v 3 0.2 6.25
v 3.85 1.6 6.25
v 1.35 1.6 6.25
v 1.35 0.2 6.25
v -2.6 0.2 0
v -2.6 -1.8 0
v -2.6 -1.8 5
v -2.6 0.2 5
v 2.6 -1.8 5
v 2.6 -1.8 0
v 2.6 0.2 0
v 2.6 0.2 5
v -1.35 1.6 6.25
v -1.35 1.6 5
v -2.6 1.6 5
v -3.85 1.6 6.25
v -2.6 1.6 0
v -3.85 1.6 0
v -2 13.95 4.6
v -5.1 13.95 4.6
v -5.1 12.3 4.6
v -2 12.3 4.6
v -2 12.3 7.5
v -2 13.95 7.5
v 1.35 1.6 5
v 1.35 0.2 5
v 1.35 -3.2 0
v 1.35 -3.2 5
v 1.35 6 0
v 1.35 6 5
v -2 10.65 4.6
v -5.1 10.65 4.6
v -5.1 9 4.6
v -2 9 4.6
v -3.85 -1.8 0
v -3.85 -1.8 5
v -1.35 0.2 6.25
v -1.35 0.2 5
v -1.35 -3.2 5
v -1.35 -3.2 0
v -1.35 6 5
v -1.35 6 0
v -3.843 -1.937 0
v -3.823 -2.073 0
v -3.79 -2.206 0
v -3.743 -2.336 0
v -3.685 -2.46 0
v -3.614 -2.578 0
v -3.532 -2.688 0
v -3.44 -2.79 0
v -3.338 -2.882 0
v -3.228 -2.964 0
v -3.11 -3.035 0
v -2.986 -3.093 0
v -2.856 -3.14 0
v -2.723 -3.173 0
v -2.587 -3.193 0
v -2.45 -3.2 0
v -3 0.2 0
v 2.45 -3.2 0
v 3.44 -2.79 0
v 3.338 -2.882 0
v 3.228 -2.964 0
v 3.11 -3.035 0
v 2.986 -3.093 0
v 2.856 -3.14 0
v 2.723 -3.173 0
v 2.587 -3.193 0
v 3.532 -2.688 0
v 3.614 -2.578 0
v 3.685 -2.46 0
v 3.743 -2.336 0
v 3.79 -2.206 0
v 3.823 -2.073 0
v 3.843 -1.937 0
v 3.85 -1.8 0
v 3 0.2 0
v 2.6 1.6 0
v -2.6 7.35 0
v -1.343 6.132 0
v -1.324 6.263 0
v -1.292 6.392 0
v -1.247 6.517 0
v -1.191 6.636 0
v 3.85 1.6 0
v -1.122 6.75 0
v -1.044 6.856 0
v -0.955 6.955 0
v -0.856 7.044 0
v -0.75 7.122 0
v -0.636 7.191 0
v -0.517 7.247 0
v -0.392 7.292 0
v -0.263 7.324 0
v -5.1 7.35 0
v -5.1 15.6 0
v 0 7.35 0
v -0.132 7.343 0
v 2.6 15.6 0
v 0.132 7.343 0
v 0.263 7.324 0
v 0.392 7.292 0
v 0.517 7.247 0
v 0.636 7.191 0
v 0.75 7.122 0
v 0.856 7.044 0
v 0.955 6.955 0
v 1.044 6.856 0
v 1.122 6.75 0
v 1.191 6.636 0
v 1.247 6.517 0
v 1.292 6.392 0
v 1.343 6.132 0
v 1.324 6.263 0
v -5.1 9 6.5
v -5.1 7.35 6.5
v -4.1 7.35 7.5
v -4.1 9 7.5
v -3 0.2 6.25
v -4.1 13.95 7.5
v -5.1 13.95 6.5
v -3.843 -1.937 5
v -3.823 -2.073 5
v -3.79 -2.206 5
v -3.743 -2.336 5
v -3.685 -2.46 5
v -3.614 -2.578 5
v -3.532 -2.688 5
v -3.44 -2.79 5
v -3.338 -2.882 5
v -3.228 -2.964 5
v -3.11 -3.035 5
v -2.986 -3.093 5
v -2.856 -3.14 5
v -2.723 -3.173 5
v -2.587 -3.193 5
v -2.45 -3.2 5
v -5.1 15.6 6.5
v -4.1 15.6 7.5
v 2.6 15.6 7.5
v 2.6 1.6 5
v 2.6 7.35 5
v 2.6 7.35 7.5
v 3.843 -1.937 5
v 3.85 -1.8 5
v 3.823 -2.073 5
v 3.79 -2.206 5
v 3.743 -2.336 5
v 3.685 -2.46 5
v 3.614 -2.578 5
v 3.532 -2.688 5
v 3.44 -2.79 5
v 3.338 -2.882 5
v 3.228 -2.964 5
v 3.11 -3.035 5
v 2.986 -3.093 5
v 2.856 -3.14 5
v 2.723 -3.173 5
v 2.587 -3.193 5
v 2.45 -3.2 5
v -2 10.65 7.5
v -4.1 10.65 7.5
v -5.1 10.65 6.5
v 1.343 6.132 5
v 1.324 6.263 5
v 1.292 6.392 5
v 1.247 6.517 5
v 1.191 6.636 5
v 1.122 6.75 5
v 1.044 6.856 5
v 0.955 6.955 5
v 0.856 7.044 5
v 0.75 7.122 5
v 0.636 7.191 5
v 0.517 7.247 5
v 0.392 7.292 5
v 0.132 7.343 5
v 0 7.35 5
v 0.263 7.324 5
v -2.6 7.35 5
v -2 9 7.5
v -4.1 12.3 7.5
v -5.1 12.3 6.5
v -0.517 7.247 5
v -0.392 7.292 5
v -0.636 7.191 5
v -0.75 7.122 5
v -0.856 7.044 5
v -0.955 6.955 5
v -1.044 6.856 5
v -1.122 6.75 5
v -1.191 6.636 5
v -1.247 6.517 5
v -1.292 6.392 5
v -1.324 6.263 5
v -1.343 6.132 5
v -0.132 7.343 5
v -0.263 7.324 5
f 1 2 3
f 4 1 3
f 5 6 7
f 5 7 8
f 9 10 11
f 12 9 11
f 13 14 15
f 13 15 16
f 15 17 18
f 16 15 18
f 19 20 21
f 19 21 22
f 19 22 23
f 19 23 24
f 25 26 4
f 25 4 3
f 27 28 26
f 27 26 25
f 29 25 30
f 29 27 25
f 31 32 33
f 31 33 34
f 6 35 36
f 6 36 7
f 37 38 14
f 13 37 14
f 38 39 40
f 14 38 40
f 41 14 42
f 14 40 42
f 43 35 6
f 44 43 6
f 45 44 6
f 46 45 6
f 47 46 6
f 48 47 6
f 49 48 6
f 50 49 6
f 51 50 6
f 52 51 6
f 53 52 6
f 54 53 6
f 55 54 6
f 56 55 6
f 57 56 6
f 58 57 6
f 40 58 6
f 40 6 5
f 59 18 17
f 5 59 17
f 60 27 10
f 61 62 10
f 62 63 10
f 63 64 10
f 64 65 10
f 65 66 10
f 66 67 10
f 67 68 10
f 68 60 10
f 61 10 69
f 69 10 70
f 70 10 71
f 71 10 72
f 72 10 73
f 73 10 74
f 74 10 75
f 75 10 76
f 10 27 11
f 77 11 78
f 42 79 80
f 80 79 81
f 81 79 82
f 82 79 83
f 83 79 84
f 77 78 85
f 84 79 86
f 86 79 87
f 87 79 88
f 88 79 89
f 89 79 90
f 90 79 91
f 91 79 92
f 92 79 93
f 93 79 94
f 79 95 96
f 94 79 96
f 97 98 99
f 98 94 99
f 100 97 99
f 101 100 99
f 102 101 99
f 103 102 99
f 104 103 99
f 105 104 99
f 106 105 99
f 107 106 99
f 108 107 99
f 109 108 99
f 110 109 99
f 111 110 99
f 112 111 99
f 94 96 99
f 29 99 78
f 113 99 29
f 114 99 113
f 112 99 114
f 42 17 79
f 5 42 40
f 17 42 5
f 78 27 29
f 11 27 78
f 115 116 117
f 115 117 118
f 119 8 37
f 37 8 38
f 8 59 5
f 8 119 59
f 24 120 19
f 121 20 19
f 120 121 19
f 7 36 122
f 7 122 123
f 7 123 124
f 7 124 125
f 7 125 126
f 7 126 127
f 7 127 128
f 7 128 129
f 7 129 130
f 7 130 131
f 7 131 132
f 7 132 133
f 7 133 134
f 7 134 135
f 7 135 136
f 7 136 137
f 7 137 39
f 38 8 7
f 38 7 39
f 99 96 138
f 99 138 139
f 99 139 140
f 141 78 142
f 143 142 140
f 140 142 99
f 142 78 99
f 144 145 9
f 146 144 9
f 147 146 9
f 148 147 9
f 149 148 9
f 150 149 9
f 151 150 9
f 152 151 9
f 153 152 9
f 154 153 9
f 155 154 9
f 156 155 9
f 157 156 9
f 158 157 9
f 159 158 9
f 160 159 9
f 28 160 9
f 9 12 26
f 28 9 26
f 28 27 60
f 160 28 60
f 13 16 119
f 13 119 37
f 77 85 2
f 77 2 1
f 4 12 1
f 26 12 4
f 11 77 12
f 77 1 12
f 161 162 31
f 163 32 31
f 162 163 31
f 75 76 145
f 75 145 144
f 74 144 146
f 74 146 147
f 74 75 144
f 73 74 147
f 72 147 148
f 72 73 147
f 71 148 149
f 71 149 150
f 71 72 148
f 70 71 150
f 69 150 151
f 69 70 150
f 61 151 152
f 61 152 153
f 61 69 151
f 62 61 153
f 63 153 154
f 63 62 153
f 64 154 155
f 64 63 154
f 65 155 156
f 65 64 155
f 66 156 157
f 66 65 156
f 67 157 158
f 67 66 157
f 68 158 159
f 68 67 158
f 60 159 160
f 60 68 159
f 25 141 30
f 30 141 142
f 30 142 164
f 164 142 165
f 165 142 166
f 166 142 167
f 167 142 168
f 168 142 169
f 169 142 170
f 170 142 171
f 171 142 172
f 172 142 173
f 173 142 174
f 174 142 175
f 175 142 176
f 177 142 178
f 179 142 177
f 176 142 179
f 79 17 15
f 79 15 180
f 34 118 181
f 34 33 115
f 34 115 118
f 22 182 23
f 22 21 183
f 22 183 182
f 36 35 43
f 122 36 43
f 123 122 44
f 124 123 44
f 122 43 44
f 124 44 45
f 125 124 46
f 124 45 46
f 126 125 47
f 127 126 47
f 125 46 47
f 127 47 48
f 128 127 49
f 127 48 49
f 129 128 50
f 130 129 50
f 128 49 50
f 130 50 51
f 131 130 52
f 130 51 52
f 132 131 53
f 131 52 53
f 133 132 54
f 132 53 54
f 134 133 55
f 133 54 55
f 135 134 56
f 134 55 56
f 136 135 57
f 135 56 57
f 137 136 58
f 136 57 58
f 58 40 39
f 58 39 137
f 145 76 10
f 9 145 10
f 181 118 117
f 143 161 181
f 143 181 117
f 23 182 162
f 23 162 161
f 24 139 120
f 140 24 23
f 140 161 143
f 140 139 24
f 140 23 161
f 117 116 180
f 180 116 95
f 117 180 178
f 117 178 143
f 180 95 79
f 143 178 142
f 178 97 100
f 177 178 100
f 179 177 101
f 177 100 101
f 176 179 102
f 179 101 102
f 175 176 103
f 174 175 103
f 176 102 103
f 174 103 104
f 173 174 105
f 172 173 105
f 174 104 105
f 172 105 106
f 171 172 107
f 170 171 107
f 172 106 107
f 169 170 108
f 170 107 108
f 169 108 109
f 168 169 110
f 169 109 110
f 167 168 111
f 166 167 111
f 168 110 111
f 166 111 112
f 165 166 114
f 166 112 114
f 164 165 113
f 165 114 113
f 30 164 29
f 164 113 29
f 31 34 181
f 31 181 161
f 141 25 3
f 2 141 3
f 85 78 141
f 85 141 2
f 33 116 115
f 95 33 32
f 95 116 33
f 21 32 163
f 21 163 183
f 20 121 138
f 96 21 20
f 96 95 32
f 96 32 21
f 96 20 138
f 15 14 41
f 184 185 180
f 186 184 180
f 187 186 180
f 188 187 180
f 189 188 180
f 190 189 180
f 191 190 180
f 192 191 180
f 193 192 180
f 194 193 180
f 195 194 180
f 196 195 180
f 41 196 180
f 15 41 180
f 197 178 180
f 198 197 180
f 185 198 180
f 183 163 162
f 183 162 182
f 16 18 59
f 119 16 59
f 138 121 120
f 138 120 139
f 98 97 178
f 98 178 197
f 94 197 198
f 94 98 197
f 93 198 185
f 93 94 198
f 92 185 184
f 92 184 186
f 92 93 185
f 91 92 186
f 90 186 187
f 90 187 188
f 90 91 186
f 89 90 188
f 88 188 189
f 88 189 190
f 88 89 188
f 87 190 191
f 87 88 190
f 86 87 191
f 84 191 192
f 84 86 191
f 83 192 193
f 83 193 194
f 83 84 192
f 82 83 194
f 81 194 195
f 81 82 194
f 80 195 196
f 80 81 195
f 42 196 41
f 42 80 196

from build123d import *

# Parameters (mm, degrees)
PAD017_DEPTH           = 5
PAD020_DEPTH           = 6.25
SKETCH059_W            = 7.7
SKETCH059_H            = 1.65
PAD029_DEPTH           = 7.5
SKETCH056_W            = 7.7
SKETCH056_H            = 1.65
PAD030_DEPTH           = 4.6
SKETCH058_W            = 7.7
SKETCH058_H            = 1.65
PAD031_DEPTH           = 7.5
SKETCH057_W            = 4.6
SKETCH057_H            = 1.65
PAD032_DEPTH           = 7.5
LINEARPATTERN012_COUNT = 2
LINEARPATTERN012_PITCH = 3.3
CHAMFER002_SIZE        = 1


with BuildPart() as bc_c:
    # Sketch034 → Pad017 (new body)
    with BuildSketch(Plane.XY):
        with BuildLine():
            Line((-1.35, -1.8), (-1.35, 6))
            ThreePointArc((0, 7.35), (-0.954594, 6.954594), (-1.35, 6))
            Line((0, 9), (0, 7.35))
            Line((-2.6, 9), (0, 9))
            Line((-2.6, -1.8), (-2.6, 9))
            Line((-3.85, -1.8), (-2.6, -1.8))
            ThreePointArc((-3.85, -1.8), (-3.439949, -2.789949), (-2.45, -3.2))
            Line((-1.35, -3.2), (-2.45, -3.2))
            Line((-1.35, -1.8), (-1.35, -3.2))
        make_face()
    extrude(amount=PAD017_DEPTH)

    # Sketch037 → Pad020 (join)
    with BuildSketch(Plane.XY):
        Polygon((-1.35, 0.2), (-1.35, 1.6), (-2.6, 1.6), (-3.85, 1.6), (-3, 0.2), (-2.6, 0.2), align=None)
    extrude(amount=PAD020_DEPTH)


with BuildPart() as bc_s_mirrored:
    # Mirror001: instance of _bc_c
    add(bc_c.part.mirror(Plane(origin=(0, 0, 0), x_dir=(0, 1, 0), z_dir=(-1, 0, 0))))


with BuildPart() as body015:
    # Fusion001 base: copy of _bc_c
    add(bc_c.part)

    # Fusion001: union _bc_s(mirrored)
    add(bc_s_mirrored.part)

    # Sketch059 → Pad029 (new body)
    with BuildSketch(Plane.XY):
        with Locations((-1.25, 8.175)):
            Rectangle(SKETCH059_W, SKETCH059_H)
    extrude(amount=PAD029_DEPTH)

    # Sketch056 → Pad030 (join)
    with BuildSketch(Plane.XY):
        with Locations((-1.25, 9.825)):
            Rectangle(SKETCH056_W, SKETCH056_H)
    pad030 = extrude(amount=PAD030_DEPTH)

    # Sketch058 → Pad031 (join)
    with BuildSketch(Plane.XY):
        with Locations((-1.25, 11.475)):
            Rectangle(SKETCH058_W, SKETCH058_H)
    pad031 = extrude(amount=PAD031_DEPTH)

    # Sketch057 → Pad032 (join)
    with BuildSketch(Plane.XY):
        with Locations((0.3, 9.825)):
            Rectangle(SKETCH057_W, SKETCH057_H)
    pad032 = extrude(amount=PAD032_DEPTH)

    # LinearPattern012: Pad030, Pad031, Pad032 ×2
    with Locations(*[(0, i * LINEARPATTERN012_PITCH, 0) for i in range(1, LINEARPATTERN012_COUNT)]):
        add(pad030)
        add(pad031)
        add(pad032)

    # Chamfer002
    chamfer002_edges = [body015.edges().sort_by_distance(p)[0] for p in [
        (-5.1, 14.775, 7.5),
        (-5.1, 11.475, 7.5),
        (-5.1, 8.175, 7.5),
    ]]
    chamfer(chamfer002_edges, length=CHAMFER002_SIZE)


solid = body015.part
